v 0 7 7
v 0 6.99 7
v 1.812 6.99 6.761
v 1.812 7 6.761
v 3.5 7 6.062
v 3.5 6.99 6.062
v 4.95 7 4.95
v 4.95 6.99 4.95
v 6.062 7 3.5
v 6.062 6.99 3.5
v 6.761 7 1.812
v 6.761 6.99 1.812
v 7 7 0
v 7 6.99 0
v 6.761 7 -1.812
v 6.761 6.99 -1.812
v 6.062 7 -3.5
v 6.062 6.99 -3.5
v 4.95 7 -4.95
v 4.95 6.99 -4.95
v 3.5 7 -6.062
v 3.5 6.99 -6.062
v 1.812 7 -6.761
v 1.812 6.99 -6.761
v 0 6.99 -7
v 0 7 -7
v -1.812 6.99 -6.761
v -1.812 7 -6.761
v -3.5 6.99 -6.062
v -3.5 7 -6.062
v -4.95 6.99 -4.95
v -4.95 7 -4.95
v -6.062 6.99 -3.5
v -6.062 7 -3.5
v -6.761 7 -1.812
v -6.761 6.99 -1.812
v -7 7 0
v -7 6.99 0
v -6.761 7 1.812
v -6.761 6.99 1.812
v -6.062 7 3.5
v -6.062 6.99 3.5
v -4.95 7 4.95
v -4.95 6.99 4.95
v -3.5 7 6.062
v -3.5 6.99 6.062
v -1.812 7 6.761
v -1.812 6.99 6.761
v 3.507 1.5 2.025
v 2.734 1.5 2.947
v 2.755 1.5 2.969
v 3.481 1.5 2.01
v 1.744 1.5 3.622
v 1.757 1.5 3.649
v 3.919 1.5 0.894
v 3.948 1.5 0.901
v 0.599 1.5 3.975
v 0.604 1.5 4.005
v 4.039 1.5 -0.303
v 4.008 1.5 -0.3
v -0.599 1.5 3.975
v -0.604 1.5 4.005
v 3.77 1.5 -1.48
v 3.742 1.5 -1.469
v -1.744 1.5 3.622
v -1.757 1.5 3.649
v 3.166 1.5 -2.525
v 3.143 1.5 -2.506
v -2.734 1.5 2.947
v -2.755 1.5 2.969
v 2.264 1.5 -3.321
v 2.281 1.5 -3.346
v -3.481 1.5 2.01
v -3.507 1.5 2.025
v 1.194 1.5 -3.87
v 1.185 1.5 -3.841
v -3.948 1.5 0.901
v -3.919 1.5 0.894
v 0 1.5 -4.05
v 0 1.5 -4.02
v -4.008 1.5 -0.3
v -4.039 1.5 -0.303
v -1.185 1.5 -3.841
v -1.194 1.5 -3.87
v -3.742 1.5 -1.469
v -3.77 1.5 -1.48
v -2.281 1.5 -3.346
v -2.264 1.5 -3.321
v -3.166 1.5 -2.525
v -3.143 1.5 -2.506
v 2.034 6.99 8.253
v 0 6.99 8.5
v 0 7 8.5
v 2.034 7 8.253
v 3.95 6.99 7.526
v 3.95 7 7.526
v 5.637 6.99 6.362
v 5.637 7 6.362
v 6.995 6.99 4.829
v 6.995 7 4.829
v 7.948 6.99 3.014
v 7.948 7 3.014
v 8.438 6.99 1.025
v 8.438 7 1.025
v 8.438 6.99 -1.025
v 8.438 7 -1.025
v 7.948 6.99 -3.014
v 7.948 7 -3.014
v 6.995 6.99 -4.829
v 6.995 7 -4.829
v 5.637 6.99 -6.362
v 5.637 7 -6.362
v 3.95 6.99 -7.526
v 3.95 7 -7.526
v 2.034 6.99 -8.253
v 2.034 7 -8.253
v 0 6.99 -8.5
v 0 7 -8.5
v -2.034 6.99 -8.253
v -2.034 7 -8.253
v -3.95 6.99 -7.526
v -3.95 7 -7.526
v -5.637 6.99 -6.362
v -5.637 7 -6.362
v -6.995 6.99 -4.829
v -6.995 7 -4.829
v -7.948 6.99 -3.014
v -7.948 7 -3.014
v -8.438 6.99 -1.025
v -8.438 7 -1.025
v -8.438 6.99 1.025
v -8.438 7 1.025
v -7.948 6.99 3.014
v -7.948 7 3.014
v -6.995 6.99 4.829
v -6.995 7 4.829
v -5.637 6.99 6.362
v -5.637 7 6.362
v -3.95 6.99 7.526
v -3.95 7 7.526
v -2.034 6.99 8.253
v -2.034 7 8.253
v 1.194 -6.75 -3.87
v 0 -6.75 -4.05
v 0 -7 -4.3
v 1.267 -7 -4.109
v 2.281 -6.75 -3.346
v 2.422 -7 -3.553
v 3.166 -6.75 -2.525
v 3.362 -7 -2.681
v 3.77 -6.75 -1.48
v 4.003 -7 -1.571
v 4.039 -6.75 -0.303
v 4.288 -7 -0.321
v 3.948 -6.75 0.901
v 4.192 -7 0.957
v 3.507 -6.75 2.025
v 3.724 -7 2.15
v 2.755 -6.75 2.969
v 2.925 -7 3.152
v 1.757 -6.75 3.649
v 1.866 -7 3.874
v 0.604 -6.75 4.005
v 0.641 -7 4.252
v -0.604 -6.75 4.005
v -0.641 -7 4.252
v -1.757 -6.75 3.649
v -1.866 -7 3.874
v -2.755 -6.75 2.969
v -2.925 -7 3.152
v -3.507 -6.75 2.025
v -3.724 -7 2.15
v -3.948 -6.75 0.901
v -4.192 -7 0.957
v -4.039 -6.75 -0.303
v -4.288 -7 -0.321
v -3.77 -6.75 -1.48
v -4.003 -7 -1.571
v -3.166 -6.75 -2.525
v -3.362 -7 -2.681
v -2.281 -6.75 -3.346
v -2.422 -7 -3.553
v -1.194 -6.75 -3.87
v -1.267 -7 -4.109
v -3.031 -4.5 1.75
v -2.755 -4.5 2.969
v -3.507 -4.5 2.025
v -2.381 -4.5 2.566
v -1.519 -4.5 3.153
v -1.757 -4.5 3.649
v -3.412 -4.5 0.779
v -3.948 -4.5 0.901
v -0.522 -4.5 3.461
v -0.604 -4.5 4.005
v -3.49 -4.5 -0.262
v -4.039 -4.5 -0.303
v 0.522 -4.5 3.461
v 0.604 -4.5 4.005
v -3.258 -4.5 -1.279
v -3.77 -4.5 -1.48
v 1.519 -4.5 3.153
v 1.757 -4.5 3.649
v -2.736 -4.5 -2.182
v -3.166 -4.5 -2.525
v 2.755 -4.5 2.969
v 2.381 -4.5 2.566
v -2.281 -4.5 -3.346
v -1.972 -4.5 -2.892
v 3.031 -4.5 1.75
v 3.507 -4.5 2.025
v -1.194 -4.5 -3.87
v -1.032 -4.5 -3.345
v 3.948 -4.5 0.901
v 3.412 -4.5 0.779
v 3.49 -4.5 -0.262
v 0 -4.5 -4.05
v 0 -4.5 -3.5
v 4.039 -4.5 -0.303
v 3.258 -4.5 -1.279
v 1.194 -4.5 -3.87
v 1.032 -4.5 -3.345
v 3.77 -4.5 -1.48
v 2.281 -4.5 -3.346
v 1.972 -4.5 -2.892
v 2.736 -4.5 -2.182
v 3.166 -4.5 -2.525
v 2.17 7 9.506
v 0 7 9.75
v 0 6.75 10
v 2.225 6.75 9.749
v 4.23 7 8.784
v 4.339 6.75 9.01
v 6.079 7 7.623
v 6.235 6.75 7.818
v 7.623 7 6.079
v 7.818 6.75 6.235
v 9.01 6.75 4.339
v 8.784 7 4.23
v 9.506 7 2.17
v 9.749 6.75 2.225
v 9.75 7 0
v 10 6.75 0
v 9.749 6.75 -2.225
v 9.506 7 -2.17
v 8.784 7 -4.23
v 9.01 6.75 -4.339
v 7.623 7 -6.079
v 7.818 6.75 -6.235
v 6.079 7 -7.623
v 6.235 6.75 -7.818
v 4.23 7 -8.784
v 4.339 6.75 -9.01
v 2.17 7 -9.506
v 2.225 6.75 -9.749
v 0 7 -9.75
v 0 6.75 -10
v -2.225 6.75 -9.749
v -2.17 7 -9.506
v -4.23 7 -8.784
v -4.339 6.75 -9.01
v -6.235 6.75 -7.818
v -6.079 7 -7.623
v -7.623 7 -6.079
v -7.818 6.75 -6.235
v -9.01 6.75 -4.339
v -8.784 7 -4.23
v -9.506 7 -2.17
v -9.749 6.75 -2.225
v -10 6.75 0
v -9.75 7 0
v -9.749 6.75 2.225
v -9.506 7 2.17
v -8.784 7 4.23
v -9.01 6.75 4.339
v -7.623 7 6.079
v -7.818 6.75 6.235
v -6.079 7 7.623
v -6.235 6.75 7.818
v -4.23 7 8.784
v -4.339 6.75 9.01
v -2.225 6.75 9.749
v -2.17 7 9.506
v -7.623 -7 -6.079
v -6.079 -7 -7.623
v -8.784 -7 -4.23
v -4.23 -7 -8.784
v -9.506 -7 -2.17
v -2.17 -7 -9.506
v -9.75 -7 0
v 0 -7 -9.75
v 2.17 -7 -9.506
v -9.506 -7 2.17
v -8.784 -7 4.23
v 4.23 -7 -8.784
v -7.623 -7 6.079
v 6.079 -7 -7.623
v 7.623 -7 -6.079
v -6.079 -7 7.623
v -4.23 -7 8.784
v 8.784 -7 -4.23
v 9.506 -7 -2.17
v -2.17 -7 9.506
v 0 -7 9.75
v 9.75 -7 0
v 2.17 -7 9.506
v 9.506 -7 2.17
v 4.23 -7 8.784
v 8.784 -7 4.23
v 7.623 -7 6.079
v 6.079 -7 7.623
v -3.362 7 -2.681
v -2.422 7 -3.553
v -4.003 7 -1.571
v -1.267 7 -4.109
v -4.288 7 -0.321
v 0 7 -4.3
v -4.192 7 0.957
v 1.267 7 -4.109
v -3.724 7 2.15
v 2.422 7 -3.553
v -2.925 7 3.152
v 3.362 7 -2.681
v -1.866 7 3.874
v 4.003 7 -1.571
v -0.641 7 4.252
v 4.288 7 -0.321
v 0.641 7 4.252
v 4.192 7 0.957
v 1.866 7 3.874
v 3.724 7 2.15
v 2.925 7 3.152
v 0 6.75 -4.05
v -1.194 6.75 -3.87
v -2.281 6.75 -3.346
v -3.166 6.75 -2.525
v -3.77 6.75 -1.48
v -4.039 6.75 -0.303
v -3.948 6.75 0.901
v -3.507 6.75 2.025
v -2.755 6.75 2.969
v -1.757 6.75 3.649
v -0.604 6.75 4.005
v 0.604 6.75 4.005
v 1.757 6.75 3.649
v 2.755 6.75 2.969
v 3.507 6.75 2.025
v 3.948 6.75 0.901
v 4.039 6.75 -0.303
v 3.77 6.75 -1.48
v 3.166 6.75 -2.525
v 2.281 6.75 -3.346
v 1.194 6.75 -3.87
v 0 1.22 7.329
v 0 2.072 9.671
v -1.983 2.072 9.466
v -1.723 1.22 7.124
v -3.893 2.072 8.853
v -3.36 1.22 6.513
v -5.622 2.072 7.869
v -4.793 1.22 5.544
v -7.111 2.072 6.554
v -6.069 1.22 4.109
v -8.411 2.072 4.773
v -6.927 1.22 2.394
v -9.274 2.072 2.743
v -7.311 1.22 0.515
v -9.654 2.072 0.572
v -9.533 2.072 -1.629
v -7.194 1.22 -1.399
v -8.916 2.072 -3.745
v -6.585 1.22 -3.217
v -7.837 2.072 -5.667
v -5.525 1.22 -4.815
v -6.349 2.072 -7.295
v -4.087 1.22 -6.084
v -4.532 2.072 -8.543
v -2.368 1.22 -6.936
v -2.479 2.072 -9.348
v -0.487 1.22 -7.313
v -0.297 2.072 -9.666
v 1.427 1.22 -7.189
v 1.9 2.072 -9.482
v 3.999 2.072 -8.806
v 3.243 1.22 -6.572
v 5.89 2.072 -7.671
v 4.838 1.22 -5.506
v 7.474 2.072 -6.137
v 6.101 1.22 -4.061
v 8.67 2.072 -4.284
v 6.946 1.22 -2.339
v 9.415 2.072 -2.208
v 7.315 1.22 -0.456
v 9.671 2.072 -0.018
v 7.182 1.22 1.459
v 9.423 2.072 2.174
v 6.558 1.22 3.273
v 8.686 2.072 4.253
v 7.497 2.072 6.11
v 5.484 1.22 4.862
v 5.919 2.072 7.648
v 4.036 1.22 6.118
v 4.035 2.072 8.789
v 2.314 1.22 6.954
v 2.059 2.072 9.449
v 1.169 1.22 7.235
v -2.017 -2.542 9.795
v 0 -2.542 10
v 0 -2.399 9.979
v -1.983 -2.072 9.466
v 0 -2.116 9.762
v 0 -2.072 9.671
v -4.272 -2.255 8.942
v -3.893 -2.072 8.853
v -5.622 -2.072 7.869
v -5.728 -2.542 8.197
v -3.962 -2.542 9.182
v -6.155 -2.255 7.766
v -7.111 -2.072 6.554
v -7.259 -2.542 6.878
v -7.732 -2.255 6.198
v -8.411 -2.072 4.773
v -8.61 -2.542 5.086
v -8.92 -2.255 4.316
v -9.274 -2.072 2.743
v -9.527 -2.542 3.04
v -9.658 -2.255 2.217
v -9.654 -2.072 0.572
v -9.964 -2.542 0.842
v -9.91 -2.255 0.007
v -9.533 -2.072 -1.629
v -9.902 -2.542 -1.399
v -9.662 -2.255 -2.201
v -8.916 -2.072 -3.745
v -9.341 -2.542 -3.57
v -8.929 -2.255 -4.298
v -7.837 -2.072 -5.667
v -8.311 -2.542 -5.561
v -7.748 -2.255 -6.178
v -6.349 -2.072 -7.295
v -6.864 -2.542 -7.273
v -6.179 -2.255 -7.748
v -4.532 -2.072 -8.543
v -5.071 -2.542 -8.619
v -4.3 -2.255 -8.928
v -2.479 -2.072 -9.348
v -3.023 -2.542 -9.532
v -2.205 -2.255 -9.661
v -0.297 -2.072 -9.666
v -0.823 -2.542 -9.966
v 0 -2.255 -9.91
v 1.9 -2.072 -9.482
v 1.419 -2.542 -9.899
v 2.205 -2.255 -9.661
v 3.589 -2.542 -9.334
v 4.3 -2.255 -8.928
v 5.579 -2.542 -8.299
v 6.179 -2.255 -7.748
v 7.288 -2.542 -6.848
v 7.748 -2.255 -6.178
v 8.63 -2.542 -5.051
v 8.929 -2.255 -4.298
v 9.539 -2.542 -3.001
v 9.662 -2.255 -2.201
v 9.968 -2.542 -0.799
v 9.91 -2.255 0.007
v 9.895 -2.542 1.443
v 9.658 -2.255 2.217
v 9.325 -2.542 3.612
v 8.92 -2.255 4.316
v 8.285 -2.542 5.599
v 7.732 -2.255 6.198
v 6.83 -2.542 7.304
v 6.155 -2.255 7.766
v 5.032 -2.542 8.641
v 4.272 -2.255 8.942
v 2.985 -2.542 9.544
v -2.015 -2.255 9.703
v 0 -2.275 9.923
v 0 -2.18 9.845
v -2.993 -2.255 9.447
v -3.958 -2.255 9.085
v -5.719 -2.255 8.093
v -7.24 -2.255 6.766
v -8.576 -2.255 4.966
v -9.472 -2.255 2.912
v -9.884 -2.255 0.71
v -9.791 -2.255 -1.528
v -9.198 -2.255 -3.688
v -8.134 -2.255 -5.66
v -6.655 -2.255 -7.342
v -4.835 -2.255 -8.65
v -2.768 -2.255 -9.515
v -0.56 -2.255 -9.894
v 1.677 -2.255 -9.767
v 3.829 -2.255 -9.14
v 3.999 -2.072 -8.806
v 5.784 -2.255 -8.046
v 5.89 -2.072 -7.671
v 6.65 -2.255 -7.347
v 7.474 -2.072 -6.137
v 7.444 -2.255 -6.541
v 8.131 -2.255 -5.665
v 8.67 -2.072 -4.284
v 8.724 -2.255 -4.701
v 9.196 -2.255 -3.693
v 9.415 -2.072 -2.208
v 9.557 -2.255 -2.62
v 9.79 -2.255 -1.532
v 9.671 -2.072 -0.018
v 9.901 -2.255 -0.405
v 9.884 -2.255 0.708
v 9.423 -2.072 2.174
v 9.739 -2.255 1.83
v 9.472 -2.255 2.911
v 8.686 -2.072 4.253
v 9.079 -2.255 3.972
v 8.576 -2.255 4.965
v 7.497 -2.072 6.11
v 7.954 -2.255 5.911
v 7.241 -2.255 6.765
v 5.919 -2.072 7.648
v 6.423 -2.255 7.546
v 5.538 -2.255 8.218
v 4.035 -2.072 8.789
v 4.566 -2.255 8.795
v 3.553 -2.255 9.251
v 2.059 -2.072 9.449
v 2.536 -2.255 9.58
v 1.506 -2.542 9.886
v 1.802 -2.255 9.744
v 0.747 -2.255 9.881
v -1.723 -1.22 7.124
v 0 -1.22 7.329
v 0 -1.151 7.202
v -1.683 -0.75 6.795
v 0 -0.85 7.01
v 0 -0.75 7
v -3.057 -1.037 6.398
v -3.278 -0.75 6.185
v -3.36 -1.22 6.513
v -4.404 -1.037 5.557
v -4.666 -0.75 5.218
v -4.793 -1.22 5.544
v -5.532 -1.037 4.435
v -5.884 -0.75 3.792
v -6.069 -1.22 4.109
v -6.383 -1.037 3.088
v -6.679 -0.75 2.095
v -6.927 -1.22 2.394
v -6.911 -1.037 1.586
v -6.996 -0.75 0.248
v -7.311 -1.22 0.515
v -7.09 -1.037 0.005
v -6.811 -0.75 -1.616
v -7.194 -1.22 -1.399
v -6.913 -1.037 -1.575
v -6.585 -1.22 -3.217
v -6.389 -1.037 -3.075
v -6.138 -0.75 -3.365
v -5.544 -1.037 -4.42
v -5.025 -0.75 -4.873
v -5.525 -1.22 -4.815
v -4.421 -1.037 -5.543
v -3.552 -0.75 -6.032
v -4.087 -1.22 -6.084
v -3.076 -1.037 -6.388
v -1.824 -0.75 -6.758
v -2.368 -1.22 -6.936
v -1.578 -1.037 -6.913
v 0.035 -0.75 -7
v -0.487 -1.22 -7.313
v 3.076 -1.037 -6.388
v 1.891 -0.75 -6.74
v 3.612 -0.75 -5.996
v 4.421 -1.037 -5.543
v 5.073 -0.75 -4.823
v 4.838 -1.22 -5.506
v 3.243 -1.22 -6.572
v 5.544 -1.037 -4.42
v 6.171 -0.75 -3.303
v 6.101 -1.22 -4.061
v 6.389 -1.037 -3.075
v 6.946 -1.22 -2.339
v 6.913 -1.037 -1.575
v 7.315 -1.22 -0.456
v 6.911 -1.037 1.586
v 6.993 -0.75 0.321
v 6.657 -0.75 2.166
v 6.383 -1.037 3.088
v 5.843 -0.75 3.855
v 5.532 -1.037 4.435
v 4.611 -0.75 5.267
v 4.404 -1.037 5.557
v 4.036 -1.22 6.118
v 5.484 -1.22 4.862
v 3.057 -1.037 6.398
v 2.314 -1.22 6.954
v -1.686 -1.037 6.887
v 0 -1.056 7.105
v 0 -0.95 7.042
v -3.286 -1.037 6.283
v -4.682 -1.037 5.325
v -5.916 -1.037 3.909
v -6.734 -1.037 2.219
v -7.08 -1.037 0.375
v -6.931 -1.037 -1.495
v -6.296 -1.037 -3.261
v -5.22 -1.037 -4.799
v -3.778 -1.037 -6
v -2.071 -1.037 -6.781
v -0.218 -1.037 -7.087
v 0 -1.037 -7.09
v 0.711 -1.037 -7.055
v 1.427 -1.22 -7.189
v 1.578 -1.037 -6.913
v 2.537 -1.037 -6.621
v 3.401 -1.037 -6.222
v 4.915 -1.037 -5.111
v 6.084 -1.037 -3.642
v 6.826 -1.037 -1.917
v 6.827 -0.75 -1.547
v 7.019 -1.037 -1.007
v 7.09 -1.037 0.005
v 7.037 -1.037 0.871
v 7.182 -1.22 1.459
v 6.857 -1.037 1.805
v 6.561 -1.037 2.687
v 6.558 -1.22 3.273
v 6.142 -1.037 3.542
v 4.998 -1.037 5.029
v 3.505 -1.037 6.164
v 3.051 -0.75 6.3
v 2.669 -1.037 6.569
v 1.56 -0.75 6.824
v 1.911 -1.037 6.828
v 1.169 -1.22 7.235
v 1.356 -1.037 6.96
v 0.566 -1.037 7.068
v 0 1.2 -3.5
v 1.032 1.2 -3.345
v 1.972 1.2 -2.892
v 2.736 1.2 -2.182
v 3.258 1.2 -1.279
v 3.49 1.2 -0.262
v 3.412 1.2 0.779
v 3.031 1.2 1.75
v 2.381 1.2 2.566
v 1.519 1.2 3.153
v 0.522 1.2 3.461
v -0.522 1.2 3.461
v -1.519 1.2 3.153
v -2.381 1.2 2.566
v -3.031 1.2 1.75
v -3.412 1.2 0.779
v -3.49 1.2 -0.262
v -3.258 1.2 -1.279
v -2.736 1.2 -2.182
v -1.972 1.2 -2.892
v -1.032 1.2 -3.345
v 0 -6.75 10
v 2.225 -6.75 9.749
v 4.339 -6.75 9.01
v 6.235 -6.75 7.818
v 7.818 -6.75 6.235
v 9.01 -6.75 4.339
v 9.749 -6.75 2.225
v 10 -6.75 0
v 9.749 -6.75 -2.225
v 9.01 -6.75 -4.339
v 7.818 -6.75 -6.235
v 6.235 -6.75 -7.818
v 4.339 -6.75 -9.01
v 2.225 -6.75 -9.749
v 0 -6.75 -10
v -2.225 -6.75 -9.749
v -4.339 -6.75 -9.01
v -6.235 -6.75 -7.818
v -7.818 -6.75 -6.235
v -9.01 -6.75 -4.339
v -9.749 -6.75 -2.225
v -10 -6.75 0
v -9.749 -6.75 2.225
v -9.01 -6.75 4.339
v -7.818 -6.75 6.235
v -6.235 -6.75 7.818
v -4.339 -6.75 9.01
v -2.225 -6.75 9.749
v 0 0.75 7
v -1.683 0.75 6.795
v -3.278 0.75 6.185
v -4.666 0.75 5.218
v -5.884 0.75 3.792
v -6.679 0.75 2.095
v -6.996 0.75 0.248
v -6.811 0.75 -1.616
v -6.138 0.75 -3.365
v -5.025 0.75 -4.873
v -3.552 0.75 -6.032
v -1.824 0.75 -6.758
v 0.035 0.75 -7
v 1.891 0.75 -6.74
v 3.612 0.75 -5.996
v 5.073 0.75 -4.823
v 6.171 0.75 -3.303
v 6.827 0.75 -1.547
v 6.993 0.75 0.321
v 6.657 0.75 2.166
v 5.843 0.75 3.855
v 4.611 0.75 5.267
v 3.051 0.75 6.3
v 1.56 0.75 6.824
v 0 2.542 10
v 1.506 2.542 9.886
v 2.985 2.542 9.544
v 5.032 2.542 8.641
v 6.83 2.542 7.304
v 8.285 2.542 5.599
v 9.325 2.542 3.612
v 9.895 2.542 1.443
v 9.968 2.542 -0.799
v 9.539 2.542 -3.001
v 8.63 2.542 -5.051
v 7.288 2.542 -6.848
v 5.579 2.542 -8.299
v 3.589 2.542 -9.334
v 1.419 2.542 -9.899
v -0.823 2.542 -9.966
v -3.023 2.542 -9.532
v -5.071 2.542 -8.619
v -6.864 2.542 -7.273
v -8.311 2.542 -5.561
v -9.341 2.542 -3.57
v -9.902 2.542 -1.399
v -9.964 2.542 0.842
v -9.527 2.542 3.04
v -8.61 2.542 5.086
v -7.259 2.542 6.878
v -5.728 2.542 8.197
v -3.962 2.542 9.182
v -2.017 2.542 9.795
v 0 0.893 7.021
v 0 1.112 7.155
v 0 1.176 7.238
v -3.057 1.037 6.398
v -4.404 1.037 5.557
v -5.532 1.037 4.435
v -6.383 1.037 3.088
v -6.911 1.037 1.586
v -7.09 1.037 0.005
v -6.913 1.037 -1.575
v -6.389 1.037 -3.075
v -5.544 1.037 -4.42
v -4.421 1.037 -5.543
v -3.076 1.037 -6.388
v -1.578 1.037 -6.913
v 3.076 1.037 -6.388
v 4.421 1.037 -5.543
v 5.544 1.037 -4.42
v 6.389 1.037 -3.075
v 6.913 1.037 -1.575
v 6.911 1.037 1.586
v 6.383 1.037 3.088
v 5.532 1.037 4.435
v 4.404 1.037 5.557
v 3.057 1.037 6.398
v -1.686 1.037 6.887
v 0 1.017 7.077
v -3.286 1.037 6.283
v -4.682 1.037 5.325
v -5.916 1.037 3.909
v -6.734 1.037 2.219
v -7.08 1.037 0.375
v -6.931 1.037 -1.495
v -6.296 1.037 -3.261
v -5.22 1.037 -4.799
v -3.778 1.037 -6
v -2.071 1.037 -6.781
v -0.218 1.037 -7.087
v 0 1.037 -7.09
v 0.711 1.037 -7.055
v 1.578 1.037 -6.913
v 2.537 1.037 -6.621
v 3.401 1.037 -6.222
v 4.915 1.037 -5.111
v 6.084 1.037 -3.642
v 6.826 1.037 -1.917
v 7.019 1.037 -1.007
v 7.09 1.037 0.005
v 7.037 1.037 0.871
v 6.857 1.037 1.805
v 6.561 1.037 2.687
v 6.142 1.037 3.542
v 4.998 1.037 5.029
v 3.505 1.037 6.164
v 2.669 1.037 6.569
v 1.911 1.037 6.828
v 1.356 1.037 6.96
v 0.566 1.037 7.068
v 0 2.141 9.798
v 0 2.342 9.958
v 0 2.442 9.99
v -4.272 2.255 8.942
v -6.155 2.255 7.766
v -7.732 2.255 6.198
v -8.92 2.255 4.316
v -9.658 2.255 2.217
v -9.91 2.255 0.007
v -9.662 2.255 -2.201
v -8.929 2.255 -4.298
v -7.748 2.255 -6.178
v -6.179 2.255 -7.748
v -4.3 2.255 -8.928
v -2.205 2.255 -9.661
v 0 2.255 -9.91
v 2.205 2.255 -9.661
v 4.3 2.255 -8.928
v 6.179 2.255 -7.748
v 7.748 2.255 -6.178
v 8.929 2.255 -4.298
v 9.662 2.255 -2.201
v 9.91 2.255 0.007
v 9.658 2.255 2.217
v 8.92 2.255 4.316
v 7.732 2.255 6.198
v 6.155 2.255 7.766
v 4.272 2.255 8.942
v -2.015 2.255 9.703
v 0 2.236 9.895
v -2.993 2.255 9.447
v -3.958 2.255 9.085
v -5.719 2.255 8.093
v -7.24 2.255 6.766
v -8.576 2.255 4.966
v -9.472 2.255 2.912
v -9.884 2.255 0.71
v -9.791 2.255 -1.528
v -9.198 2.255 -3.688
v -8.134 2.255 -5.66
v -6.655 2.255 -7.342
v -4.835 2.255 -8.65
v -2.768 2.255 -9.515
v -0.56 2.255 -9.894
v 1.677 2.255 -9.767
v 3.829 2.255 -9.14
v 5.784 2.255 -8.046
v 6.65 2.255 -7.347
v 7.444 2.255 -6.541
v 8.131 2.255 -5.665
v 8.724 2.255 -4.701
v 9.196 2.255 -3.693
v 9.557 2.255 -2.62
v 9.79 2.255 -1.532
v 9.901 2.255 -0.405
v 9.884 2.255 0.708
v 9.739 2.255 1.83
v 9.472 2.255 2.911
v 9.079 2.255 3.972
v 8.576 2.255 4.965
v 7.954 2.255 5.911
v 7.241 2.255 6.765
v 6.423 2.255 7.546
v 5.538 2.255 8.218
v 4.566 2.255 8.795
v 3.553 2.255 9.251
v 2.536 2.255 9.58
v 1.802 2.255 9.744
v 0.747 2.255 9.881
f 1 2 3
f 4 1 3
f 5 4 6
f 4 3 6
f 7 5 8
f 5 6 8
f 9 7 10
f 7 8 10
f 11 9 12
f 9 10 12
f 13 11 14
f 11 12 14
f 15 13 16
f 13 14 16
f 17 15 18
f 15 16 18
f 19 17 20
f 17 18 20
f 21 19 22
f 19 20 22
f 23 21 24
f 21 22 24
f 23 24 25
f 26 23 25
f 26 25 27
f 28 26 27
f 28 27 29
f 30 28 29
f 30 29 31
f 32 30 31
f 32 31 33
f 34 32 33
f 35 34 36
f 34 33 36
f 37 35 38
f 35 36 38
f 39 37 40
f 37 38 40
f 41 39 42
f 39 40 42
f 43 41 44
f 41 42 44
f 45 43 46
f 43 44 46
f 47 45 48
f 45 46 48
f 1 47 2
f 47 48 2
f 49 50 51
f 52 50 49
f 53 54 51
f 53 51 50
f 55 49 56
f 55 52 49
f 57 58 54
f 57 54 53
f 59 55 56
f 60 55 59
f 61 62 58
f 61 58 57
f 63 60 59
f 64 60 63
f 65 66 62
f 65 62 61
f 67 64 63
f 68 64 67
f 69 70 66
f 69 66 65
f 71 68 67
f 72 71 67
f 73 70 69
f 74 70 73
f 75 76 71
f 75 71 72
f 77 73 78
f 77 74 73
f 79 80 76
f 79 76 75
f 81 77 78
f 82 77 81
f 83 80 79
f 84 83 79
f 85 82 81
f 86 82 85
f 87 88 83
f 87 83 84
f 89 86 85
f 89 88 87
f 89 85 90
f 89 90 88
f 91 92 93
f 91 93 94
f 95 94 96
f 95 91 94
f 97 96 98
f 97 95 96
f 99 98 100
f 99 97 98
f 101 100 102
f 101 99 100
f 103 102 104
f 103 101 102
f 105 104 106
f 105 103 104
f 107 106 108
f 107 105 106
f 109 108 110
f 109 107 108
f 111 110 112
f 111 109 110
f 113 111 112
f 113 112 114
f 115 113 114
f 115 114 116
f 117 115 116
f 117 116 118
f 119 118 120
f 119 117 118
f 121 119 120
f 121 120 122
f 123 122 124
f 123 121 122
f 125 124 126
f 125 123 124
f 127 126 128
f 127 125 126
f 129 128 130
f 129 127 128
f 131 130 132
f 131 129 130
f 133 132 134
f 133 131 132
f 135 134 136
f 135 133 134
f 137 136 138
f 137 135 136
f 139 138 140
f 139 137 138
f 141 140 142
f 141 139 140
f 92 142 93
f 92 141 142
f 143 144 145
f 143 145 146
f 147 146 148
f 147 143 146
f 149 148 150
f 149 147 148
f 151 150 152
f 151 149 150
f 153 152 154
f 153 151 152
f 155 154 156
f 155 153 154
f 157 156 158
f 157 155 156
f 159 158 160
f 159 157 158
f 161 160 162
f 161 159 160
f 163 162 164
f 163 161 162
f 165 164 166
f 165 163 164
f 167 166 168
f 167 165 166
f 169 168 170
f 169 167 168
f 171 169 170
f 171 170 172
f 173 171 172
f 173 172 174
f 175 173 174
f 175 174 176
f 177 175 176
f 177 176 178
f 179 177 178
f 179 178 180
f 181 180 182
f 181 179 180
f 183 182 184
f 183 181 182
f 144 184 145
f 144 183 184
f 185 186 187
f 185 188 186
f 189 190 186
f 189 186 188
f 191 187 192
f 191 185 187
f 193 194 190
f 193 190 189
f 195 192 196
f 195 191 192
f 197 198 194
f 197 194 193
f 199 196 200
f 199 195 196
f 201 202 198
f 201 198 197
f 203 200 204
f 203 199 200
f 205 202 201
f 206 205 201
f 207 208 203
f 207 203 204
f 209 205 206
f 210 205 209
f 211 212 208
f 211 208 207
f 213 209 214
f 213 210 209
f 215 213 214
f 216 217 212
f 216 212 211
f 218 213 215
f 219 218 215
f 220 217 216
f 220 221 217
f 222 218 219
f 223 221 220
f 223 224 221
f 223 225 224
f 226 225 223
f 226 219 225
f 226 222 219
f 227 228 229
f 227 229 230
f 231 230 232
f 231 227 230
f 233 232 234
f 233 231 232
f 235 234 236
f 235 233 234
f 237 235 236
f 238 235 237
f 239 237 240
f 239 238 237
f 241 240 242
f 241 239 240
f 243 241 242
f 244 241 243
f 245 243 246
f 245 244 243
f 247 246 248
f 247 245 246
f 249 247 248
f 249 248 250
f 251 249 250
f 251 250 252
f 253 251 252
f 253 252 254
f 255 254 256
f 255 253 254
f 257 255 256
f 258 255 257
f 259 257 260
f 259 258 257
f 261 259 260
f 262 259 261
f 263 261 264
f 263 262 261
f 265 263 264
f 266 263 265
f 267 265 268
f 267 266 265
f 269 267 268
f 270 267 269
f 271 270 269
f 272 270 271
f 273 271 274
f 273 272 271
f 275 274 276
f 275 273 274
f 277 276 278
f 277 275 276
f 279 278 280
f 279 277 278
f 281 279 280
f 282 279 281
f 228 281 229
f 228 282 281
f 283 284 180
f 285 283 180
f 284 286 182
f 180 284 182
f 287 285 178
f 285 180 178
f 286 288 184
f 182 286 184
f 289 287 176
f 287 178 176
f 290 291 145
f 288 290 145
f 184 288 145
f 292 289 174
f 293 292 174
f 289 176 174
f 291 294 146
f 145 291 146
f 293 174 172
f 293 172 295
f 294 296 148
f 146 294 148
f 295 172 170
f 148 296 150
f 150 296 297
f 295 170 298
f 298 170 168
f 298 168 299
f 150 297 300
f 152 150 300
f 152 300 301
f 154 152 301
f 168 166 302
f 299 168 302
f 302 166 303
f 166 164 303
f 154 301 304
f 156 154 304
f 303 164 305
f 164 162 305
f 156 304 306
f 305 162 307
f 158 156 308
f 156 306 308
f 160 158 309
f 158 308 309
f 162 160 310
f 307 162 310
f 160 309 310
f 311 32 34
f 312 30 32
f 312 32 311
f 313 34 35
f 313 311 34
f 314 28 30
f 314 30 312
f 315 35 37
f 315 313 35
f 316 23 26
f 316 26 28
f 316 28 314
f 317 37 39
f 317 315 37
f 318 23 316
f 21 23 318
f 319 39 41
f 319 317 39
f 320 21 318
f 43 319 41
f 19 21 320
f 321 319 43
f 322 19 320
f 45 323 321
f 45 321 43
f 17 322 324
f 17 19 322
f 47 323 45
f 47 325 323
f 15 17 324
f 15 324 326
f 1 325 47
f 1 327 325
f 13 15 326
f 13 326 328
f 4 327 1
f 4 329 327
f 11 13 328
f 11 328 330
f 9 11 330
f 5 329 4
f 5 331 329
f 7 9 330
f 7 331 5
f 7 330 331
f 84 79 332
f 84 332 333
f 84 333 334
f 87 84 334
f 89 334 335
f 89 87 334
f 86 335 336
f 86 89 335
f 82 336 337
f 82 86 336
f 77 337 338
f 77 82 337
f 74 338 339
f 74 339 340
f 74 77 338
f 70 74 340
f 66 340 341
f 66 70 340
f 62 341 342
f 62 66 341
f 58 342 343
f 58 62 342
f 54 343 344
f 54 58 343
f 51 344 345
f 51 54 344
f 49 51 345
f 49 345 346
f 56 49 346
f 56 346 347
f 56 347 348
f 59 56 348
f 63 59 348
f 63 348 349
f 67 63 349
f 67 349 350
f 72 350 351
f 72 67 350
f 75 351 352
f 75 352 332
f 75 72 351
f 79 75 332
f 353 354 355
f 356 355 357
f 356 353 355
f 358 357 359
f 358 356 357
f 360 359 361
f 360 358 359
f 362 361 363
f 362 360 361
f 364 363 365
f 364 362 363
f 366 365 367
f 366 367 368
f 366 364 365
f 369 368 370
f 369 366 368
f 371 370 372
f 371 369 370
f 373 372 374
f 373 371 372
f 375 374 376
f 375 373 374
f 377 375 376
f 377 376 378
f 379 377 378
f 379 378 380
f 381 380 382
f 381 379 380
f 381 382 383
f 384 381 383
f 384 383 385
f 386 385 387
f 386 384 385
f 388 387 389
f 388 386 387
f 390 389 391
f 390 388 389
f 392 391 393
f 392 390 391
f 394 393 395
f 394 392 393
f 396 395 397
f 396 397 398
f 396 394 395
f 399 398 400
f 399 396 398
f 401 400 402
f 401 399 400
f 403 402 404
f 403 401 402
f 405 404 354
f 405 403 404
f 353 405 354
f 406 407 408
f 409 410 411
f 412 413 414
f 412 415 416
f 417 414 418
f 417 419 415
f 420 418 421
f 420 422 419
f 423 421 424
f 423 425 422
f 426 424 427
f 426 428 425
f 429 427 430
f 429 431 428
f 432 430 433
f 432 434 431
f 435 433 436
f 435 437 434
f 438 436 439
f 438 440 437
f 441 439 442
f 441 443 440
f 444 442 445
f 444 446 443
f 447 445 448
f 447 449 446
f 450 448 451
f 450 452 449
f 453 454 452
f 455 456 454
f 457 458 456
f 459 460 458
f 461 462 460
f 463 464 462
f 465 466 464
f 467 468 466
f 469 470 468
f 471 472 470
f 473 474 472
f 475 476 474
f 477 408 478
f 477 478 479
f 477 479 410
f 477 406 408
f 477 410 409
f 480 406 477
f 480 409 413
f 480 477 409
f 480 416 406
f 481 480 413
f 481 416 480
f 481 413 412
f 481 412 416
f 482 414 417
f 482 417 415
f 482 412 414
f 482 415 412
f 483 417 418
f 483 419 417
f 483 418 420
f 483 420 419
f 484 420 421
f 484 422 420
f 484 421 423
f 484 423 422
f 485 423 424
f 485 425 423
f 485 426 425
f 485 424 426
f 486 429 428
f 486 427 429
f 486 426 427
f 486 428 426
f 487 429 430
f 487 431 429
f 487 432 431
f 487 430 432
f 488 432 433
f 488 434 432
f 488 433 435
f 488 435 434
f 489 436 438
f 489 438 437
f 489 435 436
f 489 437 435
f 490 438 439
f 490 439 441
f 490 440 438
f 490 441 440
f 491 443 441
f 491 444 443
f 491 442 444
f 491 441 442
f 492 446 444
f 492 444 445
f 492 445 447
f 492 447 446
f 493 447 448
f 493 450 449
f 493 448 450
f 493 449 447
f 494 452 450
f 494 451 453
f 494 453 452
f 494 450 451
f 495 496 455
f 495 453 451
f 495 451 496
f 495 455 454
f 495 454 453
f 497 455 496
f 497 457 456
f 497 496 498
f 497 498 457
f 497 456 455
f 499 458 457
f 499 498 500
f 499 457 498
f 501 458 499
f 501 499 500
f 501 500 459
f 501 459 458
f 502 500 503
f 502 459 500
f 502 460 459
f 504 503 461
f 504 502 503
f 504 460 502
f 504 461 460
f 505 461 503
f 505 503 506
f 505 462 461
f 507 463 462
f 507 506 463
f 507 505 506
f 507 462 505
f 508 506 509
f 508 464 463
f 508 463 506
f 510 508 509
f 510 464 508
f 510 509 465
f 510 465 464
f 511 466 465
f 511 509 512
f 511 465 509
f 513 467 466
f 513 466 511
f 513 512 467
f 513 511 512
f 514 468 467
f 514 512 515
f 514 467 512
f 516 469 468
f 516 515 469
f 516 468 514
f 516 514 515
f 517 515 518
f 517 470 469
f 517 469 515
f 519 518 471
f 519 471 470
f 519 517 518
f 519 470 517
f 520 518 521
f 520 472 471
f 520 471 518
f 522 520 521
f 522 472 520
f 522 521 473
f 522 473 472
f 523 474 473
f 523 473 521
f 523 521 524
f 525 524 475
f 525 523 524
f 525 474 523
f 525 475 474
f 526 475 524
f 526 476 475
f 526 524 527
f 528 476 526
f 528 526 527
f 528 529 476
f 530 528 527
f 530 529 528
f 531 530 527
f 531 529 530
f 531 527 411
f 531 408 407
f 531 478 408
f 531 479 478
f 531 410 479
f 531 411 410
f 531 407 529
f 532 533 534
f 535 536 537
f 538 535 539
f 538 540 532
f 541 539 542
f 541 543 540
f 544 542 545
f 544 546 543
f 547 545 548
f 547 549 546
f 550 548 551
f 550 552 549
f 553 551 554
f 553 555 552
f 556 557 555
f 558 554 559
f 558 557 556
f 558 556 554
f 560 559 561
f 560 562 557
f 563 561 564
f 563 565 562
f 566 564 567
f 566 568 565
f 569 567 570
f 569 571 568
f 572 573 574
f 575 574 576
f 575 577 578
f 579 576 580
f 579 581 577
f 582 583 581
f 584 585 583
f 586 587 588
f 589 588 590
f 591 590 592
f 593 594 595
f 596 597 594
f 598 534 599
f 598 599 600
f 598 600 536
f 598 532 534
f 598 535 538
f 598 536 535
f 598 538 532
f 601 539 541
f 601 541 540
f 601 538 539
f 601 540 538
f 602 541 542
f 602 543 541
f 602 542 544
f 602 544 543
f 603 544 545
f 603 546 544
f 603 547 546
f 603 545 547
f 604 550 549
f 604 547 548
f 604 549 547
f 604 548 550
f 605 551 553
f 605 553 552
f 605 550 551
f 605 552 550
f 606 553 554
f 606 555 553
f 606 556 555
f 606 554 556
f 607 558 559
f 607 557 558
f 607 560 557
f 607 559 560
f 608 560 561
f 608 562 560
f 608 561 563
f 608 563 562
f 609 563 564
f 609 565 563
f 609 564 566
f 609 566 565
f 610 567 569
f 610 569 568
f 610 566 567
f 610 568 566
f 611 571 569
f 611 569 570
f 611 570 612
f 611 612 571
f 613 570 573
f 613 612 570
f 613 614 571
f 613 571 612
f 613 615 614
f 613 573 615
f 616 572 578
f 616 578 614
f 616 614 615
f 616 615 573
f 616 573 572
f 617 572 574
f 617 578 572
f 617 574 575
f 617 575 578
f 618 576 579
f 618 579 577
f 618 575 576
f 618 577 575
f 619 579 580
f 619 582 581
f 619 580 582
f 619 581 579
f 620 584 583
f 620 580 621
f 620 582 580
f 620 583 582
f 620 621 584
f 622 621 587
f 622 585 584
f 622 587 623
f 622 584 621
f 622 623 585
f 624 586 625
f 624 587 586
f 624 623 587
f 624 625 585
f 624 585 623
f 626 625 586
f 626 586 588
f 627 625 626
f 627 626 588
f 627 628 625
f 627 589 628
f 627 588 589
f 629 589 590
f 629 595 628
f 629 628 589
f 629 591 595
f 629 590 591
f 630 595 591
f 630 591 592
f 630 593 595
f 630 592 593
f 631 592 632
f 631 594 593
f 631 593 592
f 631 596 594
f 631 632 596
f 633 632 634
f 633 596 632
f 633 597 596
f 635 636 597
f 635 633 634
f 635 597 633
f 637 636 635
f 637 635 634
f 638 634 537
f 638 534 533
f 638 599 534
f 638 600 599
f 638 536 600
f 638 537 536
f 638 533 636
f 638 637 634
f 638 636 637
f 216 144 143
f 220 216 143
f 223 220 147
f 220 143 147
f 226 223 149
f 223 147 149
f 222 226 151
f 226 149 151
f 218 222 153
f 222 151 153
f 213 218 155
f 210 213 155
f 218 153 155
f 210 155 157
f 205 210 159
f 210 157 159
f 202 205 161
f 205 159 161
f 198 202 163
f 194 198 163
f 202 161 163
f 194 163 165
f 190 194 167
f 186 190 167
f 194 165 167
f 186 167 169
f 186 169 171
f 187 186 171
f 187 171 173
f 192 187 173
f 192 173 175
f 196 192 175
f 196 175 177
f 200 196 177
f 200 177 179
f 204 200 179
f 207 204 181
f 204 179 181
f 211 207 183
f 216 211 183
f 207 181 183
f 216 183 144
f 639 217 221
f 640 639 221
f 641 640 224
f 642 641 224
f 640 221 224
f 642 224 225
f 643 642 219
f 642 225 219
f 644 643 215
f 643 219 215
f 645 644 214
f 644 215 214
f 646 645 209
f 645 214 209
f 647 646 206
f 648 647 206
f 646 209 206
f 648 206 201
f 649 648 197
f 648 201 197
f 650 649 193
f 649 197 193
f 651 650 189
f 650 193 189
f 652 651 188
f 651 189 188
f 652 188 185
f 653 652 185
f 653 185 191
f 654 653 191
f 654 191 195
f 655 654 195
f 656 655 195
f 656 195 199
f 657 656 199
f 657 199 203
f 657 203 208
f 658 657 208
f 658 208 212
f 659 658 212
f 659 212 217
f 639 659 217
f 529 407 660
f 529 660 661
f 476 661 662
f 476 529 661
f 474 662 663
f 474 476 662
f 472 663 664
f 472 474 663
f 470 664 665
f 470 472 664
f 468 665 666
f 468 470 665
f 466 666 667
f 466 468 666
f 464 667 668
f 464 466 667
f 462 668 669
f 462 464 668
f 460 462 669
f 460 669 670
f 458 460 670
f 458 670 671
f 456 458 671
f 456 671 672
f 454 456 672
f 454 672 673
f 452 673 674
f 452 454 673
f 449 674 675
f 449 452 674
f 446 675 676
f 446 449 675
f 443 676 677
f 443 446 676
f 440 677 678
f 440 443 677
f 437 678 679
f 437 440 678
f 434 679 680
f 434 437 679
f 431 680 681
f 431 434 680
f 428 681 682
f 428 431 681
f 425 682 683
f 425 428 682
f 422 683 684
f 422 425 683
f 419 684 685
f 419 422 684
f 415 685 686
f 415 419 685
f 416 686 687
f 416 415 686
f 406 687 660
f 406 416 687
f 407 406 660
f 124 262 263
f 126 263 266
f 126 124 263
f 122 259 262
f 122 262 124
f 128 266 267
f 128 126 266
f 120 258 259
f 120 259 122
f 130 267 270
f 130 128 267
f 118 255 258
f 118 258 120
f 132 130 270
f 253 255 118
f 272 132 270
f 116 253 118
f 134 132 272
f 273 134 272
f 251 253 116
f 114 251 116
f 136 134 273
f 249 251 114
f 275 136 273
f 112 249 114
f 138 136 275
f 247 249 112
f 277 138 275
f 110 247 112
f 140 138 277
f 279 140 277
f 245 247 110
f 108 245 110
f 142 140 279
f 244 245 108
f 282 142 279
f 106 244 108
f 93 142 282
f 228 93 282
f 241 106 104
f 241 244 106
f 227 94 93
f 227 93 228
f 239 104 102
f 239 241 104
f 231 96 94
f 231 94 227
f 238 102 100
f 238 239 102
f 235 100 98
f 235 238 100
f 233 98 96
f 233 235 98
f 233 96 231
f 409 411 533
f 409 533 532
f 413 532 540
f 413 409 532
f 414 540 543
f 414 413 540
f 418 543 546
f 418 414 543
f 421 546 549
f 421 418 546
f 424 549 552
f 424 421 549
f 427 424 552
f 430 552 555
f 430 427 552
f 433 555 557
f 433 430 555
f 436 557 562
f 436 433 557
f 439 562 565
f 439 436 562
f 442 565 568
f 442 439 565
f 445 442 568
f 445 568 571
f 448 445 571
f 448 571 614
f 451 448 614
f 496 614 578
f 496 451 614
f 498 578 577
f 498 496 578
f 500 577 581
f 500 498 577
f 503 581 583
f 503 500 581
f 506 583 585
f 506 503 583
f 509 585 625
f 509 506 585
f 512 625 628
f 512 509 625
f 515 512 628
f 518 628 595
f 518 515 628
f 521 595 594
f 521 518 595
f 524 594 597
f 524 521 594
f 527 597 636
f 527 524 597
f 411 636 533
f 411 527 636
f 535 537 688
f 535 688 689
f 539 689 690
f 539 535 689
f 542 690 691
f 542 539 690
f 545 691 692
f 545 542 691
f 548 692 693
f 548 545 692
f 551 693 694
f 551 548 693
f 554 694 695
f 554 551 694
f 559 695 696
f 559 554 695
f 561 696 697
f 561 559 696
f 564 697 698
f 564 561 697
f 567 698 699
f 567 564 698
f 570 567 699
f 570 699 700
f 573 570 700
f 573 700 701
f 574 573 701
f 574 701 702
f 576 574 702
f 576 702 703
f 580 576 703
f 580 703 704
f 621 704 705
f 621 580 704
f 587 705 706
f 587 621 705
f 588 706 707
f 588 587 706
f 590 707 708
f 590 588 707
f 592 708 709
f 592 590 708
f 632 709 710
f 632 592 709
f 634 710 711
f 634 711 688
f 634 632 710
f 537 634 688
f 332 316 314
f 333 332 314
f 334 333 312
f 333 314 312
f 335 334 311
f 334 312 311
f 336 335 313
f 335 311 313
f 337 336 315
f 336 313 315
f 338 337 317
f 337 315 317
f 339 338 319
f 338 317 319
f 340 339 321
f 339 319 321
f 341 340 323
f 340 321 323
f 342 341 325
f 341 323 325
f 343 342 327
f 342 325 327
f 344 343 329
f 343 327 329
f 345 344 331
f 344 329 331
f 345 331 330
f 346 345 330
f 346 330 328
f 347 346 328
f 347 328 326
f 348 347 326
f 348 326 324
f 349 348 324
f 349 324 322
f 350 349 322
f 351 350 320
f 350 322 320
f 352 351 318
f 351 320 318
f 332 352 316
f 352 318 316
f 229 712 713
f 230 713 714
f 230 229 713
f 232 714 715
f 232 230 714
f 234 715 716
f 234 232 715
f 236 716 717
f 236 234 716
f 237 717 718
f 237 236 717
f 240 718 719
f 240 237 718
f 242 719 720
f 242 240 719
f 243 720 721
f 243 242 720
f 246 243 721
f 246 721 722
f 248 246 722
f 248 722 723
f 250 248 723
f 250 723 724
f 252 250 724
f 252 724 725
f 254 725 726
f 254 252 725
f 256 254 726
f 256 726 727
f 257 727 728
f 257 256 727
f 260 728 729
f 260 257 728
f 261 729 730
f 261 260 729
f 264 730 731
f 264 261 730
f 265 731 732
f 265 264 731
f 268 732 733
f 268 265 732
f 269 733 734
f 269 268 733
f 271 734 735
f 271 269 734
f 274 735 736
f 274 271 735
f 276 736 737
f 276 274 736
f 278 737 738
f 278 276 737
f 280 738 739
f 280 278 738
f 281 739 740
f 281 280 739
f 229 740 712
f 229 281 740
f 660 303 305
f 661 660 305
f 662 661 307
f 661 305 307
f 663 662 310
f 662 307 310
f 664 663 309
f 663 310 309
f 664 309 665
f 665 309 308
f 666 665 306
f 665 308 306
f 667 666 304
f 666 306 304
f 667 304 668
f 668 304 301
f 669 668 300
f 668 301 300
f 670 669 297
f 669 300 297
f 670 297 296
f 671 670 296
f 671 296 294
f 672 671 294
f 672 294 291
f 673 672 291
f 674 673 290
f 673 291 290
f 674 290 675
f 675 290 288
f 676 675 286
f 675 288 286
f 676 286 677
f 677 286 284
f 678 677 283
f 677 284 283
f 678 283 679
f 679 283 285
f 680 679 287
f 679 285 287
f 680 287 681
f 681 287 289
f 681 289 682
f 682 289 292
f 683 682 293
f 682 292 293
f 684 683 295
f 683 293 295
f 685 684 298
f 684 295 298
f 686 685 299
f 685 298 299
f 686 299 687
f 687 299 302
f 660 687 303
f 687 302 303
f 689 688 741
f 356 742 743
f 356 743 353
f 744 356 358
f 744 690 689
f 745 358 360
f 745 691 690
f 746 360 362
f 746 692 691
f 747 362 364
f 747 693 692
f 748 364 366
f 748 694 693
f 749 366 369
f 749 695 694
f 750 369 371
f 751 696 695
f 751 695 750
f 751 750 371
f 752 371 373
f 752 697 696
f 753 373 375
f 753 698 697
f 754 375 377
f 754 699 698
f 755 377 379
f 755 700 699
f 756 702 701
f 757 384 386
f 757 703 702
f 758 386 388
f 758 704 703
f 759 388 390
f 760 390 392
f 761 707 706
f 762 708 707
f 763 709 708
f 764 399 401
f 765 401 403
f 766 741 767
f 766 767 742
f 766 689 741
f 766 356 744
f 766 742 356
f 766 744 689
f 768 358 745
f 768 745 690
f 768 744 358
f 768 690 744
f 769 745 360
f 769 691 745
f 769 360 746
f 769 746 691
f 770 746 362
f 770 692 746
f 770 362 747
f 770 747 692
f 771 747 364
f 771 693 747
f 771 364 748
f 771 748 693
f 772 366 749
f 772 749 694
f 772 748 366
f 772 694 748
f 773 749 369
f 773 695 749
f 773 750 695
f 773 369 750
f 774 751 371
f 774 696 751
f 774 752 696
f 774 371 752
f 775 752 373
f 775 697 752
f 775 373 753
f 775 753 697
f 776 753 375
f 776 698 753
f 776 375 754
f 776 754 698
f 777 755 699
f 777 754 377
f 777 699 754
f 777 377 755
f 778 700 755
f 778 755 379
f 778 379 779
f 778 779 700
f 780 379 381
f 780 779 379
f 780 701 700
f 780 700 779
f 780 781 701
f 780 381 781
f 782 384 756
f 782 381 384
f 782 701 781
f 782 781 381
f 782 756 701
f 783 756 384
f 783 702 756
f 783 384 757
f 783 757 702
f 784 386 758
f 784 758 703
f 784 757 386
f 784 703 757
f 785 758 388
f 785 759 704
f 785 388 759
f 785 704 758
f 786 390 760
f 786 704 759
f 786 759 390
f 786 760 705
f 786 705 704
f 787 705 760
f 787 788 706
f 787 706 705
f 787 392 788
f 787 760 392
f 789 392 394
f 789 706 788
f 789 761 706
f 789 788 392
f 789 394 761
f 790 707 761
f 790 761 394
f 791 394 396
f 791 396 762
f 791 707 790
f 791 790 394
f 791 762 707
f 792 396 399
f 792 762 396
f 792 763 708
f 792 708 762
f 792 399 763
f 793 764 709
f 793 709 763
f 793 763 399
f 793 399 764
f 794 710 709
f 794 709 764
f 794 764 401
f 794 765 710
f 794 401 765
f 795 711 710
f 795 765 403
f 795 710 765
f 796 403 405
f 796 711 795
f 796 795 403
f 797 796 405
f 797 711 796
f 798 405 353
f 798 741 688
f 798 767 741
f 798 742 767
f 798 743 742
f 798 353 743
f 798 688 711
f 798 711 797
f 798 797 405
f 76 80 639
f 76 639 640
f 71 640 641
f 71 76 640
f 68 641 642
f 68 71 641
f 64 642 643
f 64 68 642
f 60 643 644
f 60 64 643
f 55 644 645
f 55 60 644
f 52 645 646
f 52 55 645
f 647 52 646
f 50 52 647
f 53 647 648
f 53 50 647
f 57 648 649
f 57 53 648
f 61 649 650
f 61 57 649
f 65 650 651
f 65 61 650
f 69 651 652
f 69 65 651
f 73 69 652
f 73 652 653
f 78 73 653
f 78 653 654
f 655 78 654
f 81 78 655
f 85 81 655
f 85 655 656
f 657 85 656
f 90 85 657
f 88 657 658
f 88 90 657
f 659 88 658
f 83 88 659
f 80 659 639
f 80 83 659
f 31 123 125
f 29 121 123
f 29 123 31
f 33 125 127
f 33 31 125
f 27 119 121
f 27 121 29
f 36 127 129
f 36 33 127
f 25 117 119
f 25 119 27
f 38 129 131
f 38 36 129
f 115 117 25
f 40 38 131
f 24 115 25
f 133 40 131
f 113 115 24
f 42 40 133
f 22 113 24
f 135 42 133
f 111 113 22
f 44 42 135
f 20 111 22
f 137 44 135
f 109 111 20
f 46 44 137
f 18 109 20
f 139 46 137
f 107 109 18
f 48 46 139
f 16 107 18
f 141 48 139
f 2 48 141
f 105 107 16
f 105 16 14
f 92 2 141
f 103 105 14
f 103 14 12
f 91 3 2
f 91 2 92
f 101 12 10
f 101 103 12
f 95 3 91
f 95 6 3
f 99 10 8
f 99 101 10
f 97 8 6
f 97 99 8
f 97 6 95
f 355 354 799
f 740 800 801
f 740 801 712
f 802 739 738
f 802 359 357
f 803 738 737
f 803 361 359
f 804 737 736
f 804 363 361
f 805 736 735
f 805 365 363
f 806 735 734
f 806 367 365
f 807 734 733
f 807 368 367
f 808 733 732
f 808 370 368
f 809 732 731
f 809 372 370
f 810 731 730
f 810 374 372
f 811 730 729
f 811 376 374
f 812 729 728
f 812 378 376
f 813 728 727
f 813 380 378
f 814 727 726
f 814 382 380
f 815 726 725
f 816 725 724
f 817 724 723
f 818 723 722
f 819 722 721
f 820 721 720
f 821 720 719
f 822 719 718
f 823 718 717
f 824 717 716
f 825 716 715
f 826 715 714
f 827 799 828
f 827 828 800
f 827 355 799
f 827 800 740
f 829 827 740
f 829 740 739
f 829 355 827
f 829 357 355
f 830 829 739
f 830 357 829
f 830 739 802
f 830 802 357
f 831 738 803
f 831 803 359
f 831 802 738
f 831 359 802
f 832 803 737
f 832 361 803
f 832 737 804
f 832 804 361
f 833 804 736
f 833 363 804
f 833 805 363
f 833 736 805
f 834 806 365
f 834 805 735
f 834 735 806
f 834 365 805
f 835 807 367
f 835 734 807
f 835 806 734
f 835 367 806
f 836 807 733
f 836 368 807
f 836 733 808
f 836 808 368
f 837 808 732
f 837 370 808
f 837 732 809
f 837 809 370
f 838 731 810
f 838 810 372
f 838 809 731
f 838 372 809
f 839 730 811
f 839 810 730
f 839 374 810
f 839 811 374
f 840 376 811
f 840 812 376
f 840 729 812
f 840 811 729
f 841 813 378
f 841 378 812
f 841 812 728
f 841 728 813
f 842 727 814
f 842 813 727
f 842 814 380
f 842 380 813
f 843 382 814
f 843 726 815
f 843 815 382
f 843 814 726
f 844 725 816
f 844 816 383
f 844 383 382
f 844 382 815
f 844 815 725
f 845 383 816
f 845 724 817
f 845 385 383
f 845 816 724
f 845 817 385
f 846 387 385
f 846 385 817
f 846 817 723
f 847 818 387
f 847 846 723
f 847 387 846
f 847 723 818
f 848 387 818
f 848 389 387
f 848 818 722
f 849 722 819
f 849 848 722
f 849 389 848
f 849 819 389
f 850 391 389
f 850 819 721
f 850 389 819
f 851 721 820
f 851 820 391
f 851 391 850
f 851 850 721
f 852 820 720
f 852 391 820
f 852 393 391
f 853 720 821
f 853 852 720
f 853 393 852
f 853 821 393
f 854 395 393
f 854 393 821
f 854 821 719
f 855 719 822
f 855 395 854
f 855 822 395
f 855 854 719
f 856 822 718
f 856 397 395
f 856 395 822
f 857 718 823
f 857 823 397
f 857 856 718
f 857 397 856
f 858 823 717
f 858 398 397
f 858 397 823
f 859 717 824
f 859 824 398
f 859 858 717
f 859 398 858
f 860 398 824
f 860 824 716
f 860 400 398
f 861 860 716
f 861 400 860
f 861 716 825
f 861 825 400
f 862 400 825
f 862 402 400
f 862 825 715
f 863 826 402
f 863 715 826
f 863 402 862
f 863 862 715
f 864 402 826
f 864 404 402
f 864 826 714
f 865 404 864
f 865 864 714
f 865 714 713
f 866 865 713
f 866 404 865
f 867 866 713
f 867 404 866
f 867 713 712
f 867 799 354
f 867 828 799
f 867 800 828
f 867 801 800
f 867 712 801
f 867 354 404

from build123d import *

# Parameters (mm, degrees)
SKETCH1_R           = 10
BOSS_EXTRUDE1_DEPTH = 7
CUT_EXTRUDE1_REACH  = 21.9
SKETCH2_R           = 3.5
FILLET4_R           = 0.5
SKETCH11_R          = 4.05
CUT_EXTRUDE2_DEPTH  = 2.5
CUT_EXTRUDE3_START  = -5.5
SKETCH12_R          = 4.05
CUT_EXTRUDE3_DEPTH  = 5.5
CUT_EXTRUDE4_START  = -0.01
SKETCH13_R          = 8.5
SKETCH13_R_2        = 7
CUT_EXTRUDE4_DEPTH  = 0.01
CHAMFER1_SIZE       = 0.25
CHAMFER2_SIZE       = 0.3
CHAMFER2_SIZE2      = 0.519615242


with BuildPart() as part:
    # Sketch1 → Boss-Extrude1 (new, symmetric)
    with BuildSketch(Plane(origin=(0, 0, 0), x_dir=(1, 0, 0), z_dir=(0, 1, 0))):
        with Locations(Location((0, 0, 0), (0, 0, 270))):
            Circle(SKETCH1_R)
    extrude(amount=BOSS_EXTRUDE1_DEPTH, both=True)

    # Sketch2 → Cut-Extrude1 (cut, up to next)
    with BuildSketch(Plane.XZ.offset(7), mode=Mode.PRIVATE) as cut_extrude1_sk1:
        with Locations(Location((0, 0, 0), (0, 0, 270))):
            Circle(SKETCH2_R)
    cut_extrude1_tool1 = extrude(cut_extrude1_sk1.sketch, amount=-CUT_EXTRUDE1_REACH, mode=Mode.PRIVATE) & part.part
    add(cut_extrude1_tool1.solids().sort_by_distance((0, -7, 0))[0], mode=Mode.SUBTRACT)

    # Sketch10 → Cut-Revolve1 (revolve, cut)
    with BuildSketch(Plane.XY, mode=Mode.PRIVATE) as cut_revolve1_sk:
        Polygon((10, 2.191910703), (7, 1.1), (7, -1.1), (10, -2.191910703), align=None)
    revolve(cut_revolve1_sk.sketch.rotate(Axis((0, 7, 0), (0, -1, 0)), 90), axis=Axis((0, 7, 0), (0, -1, 0)), mode=Mode.SUBTRACT)

    # Fillet4
    fillet4_edges = [part.edges().sort_by_distance(p)[0] for p in [
        (0, -2.191910703, -10),
        (0, -1.1, -7),
        (0, 1.1, -7),
        (0, 2.191910703, -10),
    ]]
    fillet(fillet4_edges, radius=FILLET4_R)

    # Sketch11 → Cut-Extrude2 (cut)
    with BuildSketch(Plane.XZ.offset(7)):
        with Locations(Location((0, 0, 0), (0, 0, 270))):
            Circle(SKETCH11_R)
    extrude(amount=-CUT_EXTRUDE2_DEPTH, mode=Mode.SUBTRACT)

    # Sketch12 → Cut-Extrude3 (cut)
    with BuildSketch(Plane(origin=(0, 7, 0), x_dir=(1, 0, 0), z_dir=(0, 1, 0)).offset(CUT_EXTRUDE3_START)):
        with Locations(Location((0, 0, 0), (0, 0, 90))):
            Circle(SKETCH12_R)
    extrude(amount=CUT_EXTRUDE3_DEPTH, mode=Mode.SUBTRACT)

    # Sketch13 → Cut-Extrude4 (cut)
    with BuildSketch(Plane(origin=(0, 7, 0), x_dir=(1, 0, 0), z_dir=(0, 1, 0)).offset(CUT_EXTRUDE4_START)):
        with Locations(Location((0, 0, 0), (0, 0, 270))):
            Circle(SKETCH13_R)
        with Locations(Location((0, 0, 0), (0, 0, 270))):
            Circle(SKETCH13_R_2, mode=Mode.SUBTRACT)
    extrude(amount=CUT_EXTRUDE4_DEPTH, mode=Mode.SUBTRACT)

    # Chamfer1
    chamfer1_edges = [part.edges().sort_by_distance(p)[0] for p in [
        (0, -7, -10),
        (0, -7, 4.05),
        (0, 7, 4.05),
        (0, 7, -10),
    ]]
    chamfer(chamfer1_edges, length=CHAMFER1_SIZE)

    # Chamfer2
    chamfer2_edges = [part.edges().sort_by_distance(p)[0] for p in [
        (0, 1.5, 3.5),
    ]]
    chamfer2_side = [part.faces().sort_by_distance(p)[0] for p in [
        (0, -1.5, 3.5),
    ]]
    chamfer(chamfer2_edges, length=CHAMFER2_SIZE, length2=CHAMFER2_SIZE2, reference=chamfer2_side[0])


solid = part.part
